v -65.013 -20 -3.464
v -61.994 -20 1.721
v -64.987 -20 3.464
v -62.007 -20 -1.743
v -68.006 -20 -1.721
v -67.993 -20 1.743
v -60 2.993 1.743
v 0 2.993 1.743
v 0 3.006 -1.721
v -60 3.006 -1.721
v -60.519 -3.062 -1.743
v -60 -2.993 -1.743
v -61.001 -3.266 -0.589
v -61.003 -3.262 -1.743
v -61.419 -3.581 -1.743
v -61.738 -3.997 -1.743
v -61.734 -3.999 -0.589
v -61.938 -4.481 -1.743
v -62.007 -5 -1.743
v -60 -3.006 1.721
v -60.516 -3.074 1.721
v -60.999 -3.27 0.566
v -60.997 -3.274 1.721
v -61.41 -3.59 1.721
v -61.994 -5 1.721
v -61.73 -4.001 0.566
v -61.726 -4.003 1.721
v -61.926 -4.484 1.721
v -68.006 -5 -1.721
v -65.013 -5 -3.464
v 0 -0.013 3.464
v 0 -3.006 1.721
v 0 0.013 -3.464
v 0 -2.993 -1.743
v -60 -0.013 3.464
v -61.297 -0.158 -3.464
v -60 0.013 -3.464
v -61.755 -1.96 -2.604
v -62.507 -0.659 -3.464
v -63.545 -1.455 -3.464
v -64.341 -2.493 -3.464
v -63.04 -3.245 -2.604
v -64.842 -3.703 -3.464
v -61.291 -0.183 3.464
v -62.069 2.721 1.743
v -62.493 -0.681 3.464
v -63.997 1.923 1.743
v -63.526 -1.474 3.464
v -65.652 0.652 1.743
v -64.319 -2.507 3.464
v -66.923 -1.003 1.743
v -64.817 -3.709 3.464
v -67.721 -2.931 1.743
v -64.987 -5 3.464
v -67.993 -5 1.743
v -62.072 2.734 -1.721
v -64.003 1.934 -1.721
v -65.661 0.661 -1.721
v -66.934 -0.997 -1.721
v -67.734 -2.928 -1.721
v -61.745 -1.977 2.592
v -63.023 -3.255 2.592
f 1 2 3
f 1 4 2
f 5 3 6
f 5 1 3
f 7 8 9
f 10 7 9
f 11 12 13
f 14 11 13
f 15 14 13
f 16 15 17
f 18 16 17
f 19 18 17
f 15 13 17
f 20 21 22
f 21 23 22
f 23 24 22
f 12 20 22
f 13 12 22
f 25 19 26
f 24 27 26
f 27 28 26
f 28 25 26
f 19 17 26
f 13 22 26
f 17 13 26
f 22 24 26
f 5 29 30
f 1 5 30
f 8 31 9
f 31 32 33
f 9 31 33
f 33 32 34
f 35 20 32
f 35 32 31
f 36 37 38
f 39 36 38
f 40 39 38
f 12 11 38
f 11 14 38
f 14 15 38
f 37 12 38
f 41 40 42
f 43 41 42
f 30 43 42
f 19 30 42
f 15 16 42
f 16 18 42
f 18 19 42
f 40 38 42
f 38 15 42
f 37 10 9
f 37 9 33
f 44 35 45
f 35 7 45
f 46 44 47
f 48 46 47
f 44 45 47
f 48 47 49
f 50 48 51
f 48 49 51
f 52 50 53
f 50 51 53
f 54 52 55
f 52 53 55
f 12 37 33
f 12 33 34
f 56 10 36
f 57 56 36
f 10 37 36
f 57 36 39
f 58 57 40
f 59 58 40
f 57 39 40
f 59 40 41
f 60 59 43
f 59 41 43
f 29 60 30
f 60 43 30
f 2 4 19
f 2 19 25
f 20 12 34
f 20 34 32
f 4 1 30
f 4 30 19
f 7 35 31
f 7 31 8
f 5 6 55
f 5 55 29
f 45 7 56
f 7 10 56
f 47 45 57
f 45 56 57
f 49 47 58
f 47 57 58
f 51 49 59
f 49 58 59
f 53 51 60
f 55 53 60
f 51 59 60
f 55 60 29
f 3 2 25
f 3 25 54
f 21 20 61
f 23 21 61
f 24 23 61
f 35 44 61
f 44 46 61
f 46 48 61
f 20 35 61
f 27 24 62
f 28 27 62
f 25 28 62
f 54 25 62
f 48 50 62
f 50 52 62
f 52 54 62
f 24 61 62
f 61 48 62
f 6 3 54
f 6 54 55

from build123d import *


with BuildPart() as part:
    # Sweep1: sweep along a path in Sketch1
    with BuildLine(Plane.XY) as sweep1_path:
        Line((0, 0), (-60, 0))
        ThreePointArc((-60, 0), (-63.535533906, -1.464466094), (-65, -5))
        Line((-65, -5), (-65, -20))
    # Sketch2 → Sweep1 (sweep)
    with BuildSketch(Plane.ZY):
        Polygon((1.720776661, -3.006480947), (3.464077206, -0.013004171), (1.743300546, 2.993476776), (-1.720776661, 3.006480947), (-3.464077206, 0.013004171), (-1.743300546, -2.993476776), align=None)
    sweep(path=sweep1_path.line)


solid = part.part
